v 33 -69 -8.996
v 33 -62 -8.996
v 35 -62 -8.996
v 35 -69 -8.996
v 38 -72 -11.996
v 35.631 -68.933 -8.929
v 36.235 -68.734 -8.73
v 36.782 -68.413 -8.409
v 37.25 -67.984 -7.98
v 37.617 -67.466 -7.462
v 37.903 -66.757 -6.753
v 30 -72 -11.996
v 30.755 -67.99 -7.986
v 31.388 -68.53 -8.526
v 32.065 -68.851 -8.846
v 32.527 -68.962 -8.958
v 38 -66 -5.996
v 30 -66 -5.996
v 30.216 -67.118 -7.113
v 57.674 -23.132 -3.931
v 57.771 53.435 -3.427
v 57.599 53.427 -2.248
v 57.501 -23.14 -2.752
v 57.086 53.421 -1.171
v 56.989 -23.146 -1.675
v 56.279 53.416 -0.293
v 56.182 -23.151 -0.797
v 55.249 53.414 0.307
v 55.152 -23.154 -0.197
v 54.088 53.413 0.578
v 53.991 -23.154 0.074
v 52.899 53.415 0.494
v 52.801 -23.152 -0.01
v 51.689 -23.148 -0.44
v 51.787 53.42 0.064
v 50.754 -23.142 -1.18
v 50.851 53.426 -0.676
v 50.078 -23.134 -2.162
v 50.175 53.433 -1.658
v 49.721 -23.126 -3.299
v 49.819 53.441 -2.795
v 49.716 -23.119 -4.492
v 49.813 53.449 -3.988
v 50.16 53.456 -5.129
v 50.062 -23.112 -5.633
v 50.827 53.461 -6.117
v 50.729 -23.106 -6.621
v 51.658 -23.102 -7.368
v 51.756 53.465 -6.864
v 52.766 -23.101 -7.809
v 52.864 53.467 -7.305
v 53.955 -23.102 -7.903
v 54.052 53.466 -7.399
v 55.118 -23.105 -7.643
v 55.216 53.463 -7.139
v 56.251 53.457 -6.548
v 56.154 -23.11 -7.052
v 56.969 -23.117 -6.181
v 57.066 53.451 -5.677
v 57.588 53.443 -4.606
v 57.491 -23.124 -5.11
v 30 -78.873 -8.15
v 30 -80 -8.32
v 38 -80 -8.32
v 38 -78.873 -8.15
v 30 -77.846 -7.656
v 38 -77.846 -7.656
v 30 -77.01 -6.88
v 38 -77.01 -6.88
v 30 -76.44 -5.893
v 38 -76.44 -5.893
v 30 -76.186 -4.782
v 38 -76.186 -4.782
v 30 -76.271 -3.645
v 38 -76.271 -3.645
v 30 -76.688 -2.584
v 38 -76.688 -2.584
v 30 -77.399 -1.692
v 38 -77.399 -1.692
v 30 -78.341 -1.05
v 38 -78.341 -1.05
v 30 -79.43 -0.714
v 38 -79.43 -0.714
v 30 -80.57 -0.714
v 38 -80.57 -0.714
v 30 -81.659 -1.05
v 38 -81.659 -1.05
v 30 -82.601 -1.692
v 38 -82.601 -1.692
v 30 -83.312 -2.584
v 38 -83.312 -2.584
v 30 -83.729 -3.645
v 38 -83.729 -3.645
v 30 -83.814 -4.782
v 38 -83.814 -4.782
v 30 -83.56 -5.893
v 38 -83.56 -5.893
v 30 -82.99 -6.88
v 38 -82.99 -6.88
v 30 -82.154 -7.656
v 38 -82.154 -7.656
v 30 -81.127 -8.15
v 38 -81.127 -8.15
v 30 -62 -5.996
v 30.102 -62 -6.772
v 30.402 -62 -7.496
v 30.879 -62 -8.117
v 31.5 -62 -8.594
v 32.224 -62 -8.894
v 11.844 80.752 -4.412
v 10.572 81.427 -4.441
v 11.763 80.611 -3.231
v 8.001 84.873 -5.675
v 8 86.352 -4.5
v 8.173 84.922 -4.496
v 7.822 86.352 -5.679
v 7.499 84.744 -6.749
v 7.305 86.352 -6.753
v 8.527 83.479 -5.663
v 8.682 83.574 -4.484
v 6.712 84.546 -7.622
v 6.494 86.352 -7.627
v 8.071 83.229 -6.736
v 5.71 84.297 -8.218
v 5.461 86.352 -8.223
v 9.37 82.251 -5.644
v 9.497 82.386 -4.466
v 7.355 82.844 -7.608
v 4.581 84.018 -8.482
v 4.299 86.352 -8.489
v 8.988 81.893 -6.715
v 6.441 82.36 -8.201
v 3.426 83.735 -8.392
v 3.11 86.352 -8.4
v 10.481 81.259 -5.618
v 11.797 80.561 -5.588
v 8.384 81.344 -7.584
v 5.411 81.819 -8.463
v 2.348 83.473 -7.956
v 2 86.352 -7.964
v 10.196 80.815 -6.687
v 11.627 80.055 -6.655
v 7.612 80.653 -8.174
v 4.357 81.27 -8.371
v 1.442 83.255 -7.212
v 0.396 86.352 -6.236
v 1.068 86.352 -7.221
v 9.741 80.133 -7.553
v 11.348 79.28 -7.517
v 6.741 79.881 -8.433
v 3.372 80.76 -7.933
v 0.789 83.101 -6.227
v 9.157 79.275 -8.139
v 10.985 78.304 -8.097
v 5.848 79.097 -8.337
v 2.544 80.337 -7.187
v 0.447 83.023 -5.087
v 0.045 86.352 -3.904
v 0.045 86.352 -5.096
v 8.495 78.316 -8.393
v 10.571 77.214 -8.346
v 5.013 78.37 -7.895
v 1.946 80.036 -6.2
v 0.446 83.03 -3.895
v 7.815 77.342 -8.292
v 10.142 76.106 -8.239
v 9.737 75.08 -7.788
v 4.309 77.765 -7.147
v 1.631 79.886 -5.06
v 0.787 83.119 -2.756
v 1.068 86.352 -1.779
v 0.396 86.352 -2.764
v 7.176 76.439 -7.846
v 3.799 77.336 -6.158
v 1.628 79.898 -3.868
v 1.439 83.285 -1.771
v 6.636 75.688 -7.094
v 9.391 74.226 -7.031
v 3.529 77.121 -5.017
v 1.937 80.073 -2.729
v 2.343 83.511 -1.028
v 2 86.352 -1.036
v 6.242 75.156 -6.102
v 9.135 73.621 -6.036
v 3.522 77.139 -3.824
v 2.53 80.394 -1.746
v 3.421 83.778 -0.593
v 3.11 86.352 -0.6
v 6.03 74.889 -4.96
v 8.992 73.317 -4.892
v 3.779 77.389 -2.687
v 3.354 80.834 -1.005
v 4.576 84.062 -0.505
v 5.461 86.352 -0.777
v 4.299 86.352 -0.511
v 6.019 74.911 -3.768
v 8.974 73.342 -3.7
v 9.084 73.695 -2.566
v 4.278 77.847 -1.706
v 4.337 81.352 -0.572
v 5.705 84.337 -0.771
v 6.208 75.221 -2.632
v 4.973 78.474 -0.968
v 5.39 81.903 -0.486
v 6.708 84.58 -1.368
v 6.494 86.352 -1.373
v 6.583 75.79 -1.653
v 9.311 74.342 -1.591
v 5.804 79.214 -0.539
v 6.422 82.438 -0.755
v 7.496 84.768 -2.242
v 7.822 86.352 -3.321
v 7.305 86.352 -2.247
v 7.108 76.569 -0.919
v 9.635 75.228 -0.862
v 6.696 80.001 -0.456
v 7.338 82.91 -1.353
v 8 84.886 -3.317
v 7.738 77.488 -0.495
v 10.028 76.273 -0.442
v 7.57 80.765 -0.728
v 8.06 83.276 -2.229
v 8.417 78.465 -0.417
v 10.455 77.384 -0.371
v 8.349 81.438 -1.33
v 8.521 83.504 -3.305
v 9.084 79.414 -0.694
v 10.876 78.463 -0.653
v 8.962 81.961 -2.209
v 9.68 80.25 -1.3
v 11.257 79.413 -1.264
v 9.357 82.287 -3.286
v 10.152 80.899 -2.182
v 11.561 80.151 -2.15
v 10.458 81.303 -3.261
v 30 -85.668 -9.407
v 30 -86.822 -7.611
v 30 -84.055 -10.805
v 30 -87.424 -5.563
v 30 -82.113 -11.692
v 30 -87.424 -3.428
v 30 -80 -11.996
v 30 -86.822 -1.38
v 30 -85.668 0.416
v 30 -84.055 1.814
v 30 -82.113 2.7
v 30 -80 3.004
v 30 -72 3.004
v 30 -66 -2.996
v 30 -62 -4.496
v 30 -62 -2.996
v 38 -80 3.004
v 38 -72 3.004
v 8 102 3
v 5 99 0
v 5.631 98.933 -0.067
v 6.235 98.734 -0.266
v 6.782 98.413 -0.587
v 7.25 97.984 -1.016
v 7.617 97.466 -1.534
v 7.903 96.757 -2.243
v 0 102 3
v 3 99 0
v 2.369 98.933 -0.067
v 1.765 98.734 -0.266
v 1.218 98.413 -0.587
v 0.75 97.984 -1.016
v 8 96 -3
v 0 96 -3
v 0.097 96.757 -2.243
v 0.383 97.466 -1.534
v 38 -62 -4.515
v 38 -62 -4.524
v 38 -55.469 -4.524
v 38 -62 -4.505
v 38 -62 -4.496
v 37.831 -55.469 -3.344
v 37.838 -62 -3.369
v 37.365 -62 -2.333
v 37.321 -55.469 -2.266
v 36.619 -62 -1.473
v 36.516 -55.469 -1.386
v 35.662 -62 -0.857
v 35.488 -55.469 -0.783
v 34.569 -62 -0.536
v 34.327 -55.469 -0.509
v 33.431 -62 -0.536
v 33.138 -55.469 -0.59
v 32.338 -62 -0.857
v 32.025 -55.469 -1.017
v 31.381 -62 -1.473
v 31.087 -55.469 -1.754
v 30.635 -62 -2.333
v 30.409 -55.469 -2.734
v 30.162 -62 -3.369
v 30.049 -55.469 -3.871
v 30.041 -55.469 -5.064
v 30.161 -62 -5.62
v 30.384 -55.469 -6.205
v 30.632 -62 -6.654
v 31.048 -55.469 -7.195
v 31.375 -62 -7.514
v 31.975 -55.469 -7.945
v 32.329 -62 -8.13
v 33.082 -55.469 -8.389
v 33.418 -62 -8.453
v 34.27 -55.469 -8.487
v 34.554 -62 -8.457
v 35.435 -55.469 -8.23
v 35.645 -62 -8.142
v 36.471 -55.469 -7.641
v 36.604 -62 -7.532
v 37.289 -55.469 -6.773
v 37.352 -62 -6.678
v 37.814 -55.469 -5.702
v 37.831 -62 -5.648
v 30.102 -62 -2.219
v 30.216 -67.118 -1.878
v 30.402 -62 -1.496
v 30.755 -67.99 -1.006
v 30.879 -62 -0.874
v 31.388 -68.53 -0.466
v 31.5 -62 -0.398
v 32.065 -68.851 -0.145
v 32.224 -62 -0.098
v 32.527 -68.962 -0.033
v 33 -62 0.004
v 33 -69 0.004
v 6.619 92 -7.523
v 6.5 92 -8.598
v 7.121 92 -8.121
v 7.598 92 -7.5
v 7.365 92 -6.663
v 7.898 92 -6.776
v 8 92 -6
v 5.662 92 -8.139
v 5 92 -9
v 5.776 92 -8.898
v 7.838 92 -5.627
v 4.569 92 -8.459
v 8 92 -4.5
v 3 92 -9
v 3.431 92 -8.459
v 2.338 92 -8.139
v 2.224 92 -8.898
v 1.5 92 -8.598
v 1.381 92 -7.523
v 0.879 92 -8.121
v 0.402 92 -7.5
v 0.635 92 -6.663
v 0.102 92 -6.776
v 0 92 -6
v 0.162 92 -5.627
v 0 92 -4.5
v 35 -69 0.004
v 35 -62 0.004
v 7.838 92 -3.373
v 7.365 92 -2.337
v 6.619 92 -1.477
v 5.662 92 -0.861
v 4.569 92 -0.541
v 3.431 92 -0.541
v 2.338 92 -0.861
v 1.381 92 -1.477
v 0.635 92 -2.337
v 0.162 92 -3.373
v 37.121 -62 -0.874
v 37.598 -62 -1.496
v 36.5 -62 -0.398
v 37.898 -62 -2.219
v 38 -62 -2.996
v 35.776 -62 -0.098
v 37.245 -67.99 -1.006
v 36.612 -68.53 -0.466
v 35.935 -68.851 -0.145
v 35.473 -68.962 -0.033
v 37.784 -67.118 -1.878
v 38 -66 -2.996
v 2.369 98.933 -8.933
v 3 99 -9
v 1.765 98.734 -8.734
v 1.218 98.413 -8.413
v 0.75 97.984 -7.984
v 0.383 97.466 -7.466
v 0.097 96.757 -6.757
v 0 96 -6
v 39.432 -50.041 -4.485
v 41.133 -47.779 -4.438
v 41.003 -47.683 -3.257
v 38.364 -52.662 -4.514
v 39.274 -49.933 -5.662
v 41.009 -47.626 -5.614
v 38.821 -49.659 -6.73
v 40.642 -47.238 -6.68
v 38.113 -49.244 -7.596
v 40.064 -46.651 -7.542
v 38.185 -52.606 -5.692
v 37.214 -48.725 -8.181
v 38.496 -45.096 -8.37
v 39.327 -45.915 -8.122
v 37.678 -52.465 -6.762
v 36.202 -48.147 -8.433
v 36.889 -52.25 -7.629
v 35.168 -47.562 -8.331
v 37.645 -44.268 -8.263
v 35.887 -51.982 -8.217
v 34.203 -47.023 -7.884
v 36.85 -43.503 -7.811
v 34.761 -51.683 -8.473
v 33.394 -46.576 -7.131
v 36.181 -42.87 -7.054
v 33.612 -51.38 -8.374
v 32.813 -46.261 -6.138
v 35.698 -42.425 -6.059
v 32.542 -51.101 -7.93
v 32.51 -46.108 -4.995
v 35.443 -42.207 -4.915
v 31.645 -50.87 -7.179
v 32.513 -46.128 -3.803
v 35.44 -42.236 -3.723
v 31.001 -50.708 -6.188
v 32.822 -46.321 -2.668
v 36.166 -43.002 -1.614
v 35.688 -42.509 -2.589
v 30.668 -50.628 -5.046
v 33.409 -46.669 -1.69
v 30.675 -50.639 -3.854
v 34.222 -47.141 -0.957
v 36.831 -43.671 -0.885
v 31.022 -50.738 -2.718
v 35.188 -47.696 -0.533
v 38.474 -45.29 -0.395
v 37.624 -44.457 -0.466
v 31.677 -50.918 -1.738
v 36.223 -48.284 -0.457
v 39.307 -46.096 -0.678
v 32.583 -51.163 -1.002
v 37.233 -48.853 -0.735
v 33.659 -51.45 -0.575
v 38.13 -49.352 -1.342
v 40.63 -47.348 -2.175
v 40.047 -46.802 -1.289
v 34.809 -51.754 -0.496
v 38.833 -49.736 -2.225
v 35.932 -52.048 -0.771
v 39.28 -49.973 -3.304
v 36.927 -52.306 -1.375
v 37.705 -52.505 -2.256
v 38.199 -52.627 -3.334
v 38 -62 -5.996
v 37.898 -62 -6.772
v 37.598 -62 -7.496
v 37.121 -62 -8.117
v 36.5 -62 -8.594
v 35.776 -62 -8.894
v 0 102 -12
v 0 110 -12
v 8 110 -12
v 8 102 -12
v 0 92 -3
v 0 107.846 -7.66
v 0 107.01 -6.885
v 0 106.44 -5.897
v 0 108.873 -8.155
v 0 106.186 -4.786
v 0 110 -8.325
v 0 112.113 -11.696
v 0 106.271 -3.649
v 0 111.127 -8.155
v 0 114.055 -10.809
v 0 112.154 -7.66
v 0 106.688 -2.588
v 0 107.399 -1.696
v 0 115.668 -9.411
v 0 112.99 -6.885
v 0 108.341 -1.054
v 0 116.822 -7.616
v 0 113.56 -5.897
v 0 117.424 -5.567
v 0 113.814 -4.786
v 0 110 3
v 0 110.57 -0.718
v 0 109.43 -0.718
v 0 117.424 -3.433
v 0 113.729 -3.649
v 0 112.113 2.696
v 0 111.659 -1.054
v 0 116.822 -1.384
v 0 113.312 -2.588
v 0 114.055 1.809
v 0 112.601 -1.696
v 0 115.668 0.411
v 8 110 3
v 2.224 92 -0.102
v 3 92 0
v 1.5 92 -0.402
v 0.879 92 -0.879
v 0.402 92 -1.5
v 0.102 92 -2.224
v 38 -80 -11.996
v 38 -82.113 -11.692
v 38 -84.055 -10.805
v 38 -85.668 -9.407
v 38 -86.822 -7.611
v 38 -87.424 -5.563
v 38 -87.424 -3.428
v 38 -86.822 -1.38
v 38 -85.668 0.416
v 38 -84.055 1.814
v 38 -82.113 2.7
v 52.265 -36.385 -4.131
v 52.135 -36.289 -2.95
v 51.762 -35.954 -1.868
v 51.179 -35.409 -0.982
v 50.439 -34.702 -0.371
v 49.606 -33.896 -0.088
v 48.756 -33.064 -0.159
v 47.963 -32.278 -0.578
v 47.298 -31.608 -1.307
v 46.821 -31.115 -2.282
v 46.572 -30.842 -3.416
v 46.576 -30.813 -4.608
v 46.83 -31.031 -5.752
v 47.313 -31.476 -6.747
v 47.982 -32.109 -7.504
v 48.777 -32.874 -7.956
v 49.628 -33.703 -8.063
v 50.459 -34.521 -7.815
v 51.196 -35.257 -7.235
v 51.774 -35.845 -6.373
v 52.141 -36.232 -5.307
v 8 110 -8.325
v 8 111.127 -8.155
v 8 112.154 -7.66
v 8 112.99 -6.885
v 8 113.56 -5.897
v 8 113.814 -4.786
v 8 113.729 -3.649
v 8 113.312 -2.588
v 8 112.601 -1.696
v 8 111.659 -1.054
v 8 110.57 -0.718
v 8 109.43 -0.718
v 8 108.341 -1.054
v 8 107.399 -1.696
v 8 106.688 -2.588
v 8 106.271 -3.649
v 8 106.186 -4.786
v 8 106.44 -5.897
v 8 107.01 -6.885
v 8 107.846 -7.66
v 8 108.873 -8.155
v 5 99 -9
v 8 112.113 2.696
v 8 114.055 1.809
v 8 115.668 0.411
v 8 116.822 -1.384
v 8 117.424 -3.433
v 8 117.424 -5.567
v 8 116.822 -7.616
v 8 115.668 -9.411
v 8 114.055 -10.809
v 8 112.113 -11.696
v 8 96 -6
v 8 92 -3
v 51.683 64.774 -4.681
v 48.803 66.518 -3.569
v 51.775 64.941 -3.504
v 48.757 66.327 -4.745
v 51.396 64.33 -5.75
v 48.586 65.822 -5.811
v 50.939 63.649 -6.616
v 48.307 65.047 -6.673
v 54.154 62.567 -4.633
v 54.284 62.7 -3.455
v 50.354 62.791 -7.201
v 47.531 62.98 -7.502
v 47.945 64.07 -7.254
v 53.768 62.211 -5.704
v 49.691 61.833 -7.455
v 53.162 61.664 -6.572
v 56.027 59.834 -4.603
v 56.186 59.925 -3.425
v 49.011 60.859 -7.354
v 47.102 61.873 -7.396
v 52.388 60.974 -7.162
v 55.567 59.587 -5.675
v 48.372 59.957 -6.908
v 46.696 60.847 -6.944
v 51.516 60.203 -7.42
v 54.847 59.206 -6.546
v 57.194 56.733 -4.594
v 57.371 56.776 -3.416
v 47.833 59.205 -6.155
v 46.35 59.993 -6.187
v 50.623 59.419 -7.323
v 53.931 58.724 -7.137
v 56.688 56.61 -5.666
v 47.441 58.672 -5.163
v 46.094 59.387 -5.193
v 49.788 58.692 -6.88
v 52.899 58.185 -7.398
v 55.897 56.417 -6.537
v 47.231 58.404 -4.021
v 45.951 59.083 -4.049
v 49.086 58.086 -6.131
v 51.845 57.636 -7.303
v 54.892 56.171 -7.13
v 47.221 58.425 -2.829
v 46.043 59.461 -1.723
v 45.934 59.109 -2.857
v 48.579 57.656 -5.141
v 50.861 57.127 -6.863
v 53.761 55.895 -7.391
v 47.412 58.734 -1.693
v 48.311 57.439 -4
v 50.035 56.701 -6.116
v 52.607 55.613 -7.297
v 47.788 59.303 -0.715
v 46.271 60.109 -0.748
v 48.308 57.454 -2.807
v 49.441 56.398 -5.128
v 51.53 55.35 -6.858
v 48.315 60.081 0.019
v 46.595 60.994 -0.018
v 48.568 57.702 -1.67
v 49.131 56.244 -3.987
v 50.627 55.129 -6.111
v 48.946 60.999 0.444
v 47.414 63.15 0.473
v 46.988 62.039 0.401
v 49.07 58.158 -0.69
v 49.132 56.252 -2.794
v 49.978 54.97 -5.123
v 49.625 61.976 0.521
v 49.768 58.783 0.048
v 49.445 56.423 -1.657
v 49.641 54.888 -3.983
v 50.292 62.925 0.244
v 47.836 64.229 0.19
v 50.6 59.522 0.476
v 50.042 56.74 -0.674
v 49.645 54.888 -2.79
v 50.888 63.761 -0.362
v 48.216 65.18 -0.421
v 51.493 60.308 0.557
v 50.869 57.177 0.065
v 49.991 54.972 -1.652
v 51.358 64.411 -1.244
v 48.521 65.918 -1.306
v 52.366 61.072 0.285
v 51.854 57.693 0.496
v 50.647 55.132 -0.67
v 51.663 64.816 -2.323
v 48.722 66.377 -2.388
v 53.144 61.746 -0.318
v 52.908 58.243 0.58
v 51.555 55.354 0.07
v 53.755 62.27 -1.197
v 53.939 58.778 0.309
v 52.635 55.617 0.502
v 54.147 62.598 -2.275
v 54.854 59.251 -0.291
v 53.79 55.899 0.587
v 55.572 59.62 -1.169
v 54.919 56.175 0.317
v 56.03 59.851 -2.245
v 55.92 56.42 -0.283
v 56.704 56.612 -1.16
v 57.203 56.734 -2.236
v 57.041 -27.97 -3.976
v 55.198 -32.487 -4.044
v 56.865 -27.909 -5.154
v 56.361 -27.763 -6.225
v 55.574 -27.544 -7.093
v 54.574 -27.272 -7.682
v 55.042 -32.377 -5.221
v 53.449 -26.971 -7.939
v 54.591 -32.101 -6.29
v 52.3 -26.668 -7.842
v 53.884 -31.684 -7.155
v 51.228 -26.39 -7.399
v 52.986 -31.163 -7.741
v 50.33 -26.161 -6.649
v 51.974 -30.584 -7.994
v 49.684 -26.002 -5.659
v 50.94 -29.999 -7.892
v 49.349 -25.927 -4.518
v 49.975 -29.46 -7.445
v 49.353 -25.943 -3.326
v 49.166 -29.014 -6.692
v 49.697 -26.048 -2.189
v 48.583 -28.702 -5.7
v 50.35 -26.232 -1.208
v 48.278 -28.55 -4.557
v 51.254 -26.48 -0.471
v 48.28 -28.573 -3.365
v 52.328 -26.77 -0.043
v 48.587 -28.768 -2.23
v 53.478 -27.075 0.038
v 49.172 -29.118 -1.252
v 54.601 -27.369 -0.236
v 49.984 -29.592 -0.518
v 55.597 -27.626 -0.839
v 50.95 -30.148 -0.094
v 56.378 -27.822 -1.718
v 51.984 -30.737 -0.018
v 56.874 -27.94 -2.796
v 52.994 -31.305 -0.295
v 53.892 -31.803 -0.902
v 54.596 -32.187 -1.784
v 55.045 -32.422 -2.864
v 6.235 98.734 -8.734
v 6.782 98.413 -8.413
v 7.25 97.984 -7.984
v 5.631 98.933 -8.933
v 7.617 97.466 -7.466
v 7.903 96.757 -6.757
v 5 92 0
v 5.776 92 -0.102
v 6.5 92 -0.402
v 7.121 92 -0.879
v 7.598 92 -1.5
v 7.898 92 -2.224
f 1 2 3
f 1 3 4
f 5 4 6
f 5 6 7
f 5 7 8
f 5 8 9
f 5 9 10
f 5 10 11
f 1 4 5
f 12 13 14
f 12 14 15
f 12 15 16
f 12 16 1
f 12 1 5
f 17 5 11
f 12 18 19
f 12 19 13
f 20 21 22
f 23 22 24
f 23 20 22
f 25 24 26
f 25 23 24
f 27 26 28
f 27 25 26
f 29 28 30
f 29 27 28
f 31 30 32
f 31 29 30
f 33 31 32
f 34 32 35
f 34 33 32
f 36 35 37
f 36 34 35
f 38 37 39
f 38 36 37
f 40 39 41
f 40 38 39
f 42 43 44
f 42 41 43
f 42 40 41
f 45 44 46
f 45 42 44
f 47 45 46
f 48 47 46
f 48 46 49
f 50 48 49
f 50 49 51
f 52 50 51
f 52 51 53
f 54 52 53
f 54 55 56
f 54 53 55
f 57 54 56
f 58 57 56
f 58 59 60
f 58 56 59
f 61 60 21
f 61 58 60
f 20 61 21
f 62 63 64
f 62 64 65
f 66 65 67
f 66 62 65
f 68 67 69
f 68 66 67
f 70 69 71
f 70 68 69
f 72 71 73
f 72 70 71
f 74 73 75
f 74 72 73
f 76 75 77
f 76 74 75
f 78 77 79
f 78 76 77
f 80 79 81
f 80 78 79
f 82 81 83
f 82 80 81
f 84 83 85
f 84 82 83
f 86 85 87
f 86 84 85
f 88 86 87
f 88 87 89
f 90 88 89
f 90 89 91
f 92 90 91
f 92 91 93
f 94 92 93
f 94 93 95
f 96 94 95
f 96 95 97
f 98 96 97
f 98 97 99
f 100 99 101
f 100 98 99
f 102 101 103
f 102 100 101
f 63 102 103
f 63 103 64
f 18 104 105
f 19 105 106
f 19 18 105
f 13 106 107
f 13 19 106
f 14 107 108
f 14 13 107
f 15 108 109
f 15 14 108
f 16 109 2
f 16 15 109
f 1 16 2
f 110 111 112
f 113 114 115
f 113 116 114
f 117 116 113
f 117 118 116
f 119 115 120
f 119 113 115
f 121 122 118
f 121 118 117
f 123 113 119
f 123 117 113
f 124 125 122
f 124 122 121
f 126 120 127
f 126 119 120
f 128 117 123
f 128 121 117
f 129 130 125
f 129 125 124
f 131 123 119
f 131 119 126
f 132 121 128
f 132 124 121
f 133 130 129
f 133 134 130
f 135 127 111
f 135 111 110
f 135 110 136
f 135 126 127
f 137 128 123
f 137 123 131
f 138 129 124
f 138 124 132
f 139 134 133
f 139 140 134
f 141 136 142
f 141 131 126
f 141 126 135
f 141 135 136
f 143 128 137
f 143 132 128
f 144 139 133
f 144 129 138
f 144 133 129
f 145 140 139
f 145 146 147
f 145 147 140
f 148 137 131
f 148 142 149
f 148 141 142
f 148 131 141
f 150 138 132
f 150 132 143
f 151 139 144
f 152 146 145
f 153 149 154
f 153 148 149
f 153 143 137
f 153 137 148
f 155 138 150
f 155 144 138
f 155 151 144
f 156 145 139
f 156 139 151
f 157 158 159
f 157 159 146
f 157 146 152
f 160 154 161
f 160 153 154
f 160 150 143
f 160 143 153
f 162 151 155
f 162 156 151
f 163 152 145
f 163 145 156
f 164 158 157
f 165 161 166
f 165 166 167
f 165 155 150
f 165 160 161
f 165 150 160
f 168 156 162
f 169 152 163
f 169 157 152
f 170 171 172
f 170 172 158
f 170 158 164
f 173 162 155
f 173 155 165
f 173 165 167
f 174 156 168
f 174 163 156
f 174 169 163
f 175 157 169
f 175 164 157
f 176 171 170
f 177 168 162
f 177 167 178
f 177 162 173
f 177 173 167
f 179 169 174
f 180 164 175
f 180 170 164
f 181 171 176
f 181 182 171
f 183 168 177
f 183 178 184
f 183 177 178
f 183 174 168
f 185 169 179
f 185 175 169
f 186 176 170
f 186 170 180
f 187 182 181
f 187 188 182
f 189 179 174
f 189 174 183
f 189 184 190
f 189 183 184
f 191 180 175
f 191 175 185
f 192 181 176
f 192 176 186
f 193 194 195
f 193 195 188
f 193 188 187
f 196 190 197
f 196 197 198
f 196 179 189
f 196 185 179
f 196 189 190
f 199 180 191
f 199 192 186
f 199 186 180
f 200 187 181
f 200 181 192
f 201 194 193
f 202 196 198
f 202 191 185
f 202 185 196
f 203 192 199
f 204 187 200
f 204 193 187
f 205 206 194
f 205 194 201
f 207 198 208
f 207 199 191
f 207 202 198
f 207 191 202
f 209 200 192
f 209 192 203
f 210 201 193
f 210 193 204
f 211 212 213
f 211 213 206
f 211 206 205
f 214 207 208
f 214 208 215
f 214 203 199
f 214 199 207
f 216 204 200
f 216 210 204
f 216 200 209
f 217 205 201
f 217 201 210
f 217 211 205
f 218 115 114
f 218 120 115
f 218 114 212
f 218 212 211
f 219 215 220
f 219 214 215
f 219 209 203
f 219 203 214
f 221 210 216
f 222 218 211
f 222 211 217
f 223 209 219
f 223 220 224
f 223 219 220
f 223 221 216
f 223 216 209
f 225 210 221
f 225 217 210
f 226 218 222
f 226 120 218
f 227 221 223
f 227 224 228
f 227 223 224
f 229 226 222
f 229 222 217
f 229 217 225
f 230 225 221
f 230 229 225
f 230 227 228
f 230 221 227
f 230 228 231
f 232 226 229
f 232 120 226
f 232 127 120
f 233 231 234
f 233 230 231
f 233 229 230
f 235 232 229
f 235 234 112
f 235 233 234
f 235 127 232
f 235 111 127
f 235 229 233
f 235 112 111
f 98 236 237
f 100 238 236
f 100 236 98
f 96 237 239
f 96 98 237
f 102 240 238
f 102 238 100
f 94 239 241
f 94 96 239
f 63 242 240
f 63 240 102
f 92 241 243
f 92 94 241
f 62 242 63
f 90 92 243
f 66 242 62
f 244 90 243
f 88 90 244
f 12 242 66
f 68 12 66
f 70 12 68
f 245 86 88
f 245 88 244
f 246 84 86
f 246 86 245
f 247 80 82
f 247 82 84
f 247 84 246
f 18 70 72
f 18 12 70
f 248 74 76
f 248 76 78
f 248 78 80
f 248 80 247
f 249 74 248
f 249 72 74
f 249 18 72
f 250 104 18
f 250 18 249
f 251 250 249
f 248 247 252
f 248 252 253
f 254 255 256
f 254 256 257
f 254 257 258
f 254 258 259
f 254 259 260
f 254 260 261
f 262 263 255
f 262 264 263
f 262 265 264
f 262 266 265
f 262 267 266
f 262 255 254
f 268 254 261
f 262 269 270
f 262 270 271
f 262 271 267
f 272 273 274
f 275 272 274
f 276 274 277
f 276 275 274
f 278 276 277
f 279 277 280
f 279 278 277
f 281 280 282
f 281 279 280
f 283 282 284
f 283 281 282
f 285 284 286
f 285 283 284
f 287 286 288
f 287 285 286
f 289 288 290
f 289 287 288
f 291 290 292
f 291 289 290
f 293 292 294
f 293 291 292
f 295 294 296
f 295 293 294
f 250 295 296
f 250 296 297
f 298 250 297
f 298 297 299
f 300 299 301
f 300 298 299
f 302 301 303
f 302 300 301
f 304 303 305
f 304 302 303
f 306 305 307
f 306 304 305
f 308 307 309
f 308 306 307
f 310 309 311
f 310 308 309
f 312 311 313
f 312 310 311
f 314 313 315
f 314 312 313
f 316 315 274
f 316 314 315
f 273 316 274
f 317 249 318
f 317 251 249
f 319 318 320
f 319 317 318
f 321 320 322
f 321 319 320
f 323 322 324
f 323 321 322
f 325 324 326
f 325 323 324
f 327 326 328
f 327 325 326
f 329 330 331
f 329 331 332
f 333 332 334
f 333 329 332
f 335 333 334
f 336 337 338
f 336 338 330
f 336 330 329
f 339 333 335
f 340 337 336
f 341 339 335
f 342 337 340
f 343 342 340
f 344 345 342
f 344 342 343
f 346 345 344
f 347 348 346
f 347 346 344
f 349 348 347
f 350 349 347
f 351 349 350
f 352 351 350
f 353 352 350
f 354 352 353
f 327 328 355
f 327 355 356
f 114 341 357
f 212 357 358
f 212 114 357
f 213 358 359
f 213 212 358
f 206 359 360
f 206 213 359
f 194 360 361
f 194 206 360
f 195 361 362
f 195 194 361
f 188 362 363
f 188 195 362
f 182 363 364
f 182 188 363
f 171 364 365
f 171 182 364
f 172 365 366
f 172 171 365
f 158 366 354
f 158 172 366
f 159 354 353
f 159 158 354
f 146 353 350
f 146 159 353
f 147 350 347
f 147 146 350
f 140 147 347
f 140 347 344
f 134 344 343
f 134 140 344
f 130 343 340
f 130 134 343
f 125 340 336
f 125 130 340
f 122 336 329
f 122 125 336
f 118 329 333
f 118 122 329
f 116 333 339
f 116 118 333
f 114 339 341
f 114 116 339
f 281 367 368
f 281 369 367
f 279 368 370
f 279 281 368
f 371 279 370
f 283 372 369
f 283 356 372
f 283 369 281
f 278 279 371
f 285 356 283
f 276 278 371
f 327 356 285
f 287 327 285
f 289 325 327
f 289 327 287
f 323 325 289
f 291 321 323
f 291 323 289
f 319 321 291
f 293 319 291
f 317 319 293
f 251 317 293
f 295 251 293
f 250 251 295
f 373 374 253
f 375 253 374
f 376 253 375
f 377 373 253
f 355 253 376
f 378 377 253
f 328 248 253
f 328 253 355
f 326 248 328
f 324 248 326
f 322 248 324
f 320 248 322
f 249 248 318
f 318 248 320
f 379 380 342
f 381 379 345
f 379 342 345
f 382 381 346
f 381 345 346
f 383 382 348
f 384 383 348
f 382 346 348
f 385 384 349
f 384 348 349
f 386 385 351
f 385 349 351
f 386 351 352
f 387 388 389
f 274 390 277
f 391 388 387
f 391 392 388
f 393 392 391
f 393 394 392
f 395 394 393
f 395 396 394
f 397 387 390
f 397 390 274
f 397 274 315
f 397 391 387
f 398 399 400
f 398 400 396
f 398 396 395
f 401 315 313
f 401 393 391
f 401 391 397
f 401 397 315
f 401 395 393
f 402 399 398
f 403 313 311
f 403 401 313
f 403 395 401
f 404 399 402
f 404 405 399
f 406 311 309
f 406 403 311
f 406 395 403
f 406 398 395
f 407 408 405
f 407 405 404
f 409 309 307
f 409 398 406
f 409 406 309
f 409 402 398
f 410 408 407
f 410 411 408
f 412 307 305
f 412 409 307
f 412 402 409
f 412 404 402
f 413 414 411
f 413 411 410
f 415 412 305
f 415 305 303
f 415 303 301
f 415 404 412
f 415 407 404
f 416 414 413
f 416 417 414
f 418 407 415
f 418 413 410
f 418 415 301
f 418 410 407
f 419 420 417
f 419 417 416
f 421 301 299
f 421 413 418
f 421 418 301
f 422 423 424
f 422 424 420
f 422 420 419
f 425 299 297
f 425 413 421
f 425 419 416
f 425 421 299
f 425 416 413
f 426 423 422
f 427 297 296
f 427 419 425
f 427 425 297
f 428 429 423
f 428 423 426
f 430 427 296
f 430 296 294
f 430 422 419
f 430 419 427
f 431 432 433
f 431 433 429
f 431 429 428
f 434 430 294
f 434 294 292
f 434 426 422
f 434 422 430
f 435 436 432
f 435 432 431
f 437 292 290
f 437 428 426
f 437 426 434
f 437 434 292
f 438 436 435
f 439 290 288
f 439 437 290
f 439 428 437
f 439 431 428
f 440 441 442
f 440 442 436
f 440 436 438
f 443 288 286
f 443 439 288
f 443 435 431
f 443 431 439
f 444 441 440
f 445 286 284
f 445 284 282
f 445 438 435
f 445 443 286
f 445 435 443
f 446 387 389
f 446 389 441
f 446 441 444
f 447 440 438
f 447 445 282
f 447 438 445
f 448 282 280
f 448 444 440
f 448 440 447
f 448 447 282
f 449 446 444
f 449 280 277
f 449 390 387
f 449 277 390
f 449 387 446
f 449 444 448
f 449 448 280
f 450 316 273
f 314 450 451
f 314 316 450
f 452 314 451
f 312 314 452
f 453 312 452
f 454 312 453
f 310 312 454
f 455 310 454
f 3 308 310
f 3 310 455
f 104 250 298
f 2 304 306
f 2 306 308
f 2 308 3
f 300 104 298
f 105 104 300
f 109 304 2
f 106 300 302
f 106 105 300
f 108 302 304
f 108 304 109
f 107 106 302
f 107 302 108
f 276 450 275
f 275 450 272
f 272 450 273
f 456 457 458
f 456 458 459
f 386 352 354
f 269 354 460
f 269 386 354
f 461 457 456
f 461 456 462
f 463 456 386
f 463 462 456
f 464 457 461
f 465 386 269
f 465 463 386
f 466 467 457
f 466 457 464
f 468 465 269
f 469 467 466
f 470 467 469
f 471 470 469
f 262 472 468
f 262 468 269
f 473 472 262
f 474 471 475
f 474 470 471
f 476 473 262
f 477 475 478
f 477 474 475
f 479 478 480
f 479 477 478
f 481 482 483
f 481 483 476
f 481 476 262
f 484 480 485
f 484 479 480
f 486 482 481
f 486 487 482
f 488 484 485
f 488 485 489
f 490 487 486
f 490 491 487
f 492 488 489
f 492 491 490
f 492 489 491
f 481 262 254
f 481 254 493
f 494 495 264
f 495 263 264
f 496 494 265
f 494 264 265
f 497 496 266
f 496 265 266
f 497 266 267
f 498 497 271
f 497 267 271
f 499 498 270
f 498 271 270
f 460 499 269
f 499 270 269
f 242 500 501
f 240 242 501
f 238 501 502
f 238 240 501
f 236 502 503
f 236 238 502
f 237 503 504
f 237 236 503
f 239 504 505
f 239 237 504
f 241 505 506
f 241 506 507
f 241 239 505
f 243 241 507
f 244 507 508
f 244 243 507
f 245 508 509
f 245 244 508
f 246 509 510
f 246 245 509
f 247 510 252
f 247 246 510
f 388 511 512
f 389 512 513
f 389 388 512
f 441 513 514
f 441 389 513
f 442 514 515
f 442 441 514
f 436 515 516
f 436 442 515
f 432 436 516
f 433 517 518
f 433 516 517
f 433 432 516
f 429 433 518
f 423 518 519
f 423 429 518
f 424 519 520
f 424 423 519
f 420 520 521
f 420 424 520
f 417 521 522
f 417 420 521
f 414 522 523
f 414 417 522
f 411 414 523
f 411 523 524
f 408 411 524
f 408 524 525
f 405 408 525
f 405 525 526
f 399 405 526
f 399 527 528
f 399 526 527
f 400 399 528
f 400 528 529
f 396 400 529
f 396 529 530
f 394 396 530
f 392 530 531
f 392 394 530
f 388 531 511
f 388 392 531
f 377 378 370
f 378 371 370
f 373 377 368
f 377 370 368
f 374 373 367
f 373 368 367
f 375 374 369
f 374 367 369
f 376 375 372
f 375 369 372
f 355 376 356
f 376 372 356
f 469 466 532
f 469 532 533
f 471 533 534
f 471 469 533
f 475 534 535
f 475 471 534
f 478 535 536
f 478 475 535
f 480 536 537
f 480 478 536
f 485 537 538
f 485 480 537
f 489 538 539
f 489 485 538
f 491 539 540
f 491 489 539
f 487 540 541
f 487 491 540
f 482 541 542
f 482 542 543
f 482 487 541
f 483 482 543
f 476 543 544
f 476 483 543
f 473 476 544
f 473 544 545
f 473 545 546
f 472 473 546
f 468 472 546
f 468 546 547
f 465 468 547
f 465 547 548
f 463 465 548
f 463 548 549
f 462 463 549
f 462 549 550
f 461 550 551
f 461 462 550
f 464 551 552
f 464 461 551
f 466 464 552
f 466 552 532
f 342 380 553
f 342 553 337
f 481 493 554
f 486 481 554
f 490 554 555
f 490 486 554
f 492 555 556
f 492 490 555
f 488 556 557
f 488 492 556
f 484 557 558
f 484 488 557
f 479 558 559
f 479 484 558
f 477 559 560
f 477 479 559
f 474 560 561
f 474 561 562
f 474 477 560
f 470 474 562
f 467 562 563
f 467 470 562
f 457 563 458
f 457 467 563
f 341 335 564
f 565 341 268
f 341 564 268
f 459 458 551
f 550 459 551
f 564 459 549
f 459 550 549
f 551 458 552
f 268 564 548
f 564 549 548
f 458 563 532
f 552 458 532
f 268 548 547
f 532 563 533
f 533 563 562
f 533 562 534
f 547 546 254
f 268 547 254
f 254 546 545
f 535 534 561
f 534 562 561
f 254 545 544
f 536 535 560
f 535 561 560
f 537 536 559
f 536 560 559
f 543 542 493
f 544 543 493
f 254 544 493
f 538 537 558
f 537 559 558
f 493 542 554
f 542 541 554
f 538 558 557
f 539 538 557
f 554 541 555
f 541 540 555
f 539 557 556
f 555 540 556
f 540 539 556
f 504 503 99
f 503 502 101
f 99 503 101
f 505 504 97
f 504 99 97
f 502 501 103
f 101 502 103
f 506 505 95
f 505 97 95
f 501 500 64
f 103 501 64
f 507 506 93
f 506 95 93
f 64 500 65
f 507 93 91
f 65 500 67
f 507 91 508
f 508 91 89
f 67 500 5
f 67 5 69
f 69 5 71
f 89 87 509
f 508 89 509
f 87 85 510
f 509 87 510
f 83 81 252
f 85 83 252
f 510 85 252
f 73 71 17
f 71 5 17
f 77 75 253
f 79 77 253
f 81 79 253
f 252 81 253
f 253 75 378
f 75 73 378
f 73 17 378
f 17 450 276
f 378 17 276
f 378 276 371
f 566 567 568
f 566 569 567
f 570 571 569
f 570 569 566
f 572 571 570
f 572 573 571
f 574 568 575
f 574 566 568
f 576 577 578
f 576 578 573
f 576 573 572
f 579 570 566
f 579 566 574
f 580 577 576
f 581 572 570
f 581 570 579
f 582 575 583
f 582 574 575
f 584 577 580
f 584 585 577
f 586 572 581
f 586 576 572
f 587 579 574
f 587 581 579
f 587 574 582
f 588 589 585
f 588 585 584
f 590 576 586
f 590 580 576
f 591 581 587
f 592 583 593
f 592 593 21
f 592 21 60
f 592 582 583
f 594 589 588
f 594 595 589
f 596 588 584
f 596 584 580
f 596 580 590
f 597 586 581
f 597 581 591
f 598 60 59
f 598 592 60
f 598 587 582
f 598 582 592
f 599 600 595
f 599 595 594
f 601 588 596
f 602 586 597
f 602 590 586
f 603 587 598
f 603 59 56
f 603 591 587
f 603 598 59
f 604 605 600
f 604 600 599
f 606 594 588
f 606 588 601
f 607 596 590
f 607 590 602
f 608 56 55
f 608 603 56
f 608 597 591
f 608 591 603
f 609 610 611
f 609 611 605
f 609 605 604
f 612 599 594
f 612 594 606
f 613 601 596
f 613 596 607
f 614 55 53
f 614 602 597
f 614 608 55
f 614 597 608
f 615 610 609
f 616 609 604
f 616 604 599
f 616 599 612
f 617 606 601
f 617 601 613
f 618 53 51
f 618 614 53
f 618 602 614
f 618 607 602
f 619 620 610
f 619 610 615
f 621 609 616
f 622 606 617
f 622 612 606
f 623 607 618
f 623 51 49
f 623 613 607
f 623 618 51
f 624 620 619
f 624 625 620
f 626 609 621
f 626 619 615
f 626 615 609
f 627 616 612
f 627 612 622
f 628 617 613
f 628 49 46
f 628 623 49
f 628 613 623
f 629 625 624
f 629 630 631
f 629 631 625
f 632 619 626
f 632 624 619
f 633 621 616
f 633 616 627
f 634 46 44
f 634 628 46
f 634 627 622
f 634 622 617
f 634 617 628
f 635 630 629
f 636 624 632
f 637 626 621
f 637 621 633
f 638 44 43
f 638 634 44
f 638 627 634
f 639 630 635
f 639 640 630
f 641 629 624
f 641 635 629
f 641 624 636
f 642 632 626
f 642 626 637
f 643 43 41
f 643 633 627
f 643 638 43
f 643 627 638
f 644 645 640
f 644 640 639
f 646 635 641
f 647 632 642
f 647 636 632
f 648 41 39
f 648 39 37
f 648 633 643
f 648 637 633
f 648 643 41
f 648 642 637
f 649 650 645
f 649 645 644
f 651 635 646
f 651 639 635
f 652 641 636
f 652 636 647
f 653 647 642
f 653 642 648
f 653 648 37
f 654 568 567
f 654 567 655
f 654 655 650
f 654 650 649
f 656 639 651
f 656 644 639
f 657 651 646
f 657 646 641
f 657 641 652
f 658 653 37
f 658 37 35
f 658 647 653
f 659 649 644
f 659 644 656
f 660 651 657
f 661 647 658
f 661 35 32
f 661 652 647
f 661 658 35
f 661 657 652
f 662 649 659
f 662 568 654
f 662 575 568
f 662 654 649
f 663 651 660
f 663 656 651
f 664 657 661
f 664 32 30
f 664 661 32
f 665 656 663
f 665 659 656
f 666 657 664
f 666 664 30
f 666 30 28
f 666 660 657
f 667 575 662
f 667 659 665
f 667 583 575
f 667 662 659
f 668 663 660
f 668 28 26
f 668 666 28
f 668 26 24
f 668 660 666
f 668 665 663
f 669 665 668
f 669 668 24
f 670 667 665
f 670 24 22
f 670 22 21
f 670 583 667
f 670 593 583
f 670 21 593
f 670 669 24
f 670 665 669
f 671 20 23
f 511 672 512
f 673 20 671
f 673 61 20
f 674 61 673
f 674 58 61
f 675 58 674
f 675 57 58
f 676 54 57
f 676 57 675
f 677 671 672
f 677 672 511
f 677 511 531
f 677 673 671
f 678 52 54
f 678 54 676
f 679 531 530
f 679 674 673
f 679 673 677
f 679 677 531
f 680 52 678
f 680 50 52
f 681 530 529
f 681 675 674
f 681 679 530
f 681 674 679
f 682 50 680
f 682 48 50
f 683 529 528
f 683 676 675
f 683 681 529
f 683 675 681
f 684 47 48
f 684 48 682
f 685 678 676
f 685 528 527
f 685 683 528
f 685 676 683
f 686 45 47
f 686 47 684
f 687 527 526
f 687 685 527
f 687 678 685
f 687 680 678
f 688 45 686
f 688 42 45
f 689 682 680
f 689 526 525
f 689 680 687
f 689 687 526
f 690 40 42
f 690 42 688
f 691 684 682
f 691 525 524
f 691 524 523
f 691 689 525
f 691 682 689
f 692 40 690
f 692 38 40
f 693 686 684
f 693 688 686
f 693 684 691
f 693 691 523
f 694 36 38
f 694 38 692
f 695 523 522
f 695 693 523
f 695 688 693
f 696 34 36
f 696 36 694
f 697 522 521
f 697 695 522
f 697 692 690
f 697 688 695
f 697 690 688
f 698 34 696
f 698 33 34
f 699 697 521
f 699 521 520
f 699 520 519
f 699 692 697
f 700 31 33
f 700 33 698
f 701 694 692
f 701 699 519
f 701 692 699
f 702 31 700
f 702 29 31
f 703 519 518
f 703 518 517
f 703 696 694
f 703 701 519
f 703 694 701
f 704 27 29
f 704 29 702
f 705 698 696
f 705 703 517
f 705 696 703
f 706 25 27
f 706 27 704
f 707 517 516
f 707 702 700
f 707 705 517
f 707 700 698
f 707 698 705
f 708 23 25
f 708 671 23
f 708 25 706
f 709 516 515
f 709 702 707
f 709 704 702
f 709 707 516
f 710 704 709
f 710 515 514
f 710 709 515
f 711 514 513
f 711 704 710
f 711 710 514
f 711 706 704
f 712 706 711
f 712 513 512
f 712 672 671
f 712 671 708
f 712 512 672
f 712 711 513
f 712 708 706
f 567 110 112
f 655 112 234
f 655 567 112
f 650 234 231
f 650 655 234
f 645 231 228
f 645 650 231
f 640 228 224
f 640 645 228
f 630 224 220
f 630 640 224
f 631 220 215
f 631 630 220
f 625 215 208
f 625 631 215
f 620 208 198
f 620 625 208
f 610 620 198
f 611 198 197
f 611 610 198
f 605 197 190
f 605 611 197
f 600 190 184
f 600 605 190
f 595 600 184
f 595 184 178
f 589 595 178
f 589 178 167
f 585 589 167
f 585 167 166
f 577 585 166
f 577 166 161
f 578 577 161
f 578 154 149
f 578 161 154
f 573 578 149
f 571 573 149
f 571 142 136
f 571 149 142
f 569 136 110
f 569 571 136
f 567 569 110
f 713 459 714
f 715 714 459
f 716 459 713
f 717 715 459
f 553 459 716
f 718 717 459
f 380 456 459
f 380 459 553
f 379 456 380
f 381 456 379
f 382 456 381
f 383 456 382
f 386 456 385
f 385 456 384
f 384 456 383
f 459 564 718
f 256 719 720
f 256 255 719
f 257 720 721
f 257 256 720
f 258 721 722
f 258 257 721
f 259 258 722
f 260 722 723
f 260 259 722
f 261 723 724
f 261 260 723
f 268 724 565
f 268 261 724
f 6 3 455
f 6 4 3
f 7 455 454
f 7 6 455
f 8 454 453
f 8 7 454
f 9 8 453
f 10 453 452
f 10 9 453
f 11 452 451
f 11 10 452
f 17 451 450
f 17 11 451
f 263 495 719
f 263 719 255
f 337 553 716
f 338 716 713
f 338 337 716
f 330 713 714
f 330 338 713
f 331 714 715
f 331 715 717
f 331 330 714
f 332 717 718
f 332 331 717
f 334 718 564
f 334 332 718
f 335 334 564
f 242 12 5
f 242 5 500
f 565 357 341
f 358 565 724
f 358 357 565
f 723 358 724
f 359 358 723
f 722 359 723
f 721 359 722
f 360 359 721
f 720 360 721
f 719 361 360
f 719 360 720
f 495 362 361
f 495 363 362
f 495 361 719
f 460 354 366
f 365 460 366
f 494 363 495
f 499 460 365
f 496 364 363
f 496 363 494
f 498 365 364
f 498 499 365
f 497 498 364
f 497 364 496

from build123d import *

# Parameters (mm, degrees)
SKETCH1_R           = 3.824529863
BOSS_EXTRUDE1_DEPTH = 8
FILLET1_R           = 3
SKETCH4_R           = 3.824529863
BOSS_EXTRUDE3_DEPTH = 8
SKETCH5_R           = 4
FILLET3_R           = 3


with BuildPart() as part:
    # Sketch1 → Boss-Extrude1 (new body)
    with BuildSketch(Plane(origin=(0, 0, 0), x_dir=(0, 0, -1), z_dir=(1, 0, 0))):
        with BuildLine():
            Line((0, 92), (0, 99))
            Line((0, 99), (-3, 102))
            Line((-3, 102), (-3, 110))
            ThreePointArc((-3, 110), (4.5, 117.5), (12, 110))
            Line((12, 110), (12, 102))
            Line((12, 102), (9, 99))
            Line((9, 99), (9, 92))
            Line((9, 92), (0, 92))
        make_face()
        with Locations((4.5, 110)):
            Circle(SKETCH1_R, mode=Mode.SUBTRACT)
    extrude(amount=BOSS_EXTRUDE1_DEPTH)

    # Fillet1
    fillet1_edges = [part.edges().sort_by_distance(p)[0] for p in [
        (0, 95.5, -9),
        (8, 95.5, 0),
        (8, 95.5, -9),
        (0, 95.5, 0),
    ]]
    fillet(fillet1_edges, radius=FILLET1_R)



with BuildPart() as body_2:
    # Sketch4 → Boss-Extrude3 (new body)
    with BuildSketch(Plane(origin=(30, 0, 0), x_dir=(0, 0, -1), z_dir=(1, 0, 0))):
        with BuildLine():
            Line((-0.004228731, -61.999999953), (8.995771269, -61.999999953))
            Line((8.995771269, -61.999999953), (8.995771269, -68.999999953))
            Line((8.995771269, -68.999999953), (11.995771269, -71.999999953))
            Line((11.995771269, -71.999999953), (11.995771269, -79.999999953))
            ThreePointArc((11.995771269, -79.999999953), (4.495771269, -87.499999953), (-3.004228731, -79.999999953))
            Line((-3.004228731, -79.999999953), (-3.004228731, -71.999999953))
            Line((-3.004228731, -71.999999953), (-0.004228731, -68.999999953))
            Line((-0.004228731, -68.999999953), (-0.004228731, -61.999999953))
        make_face()
        with Locations((4.495771269, -79.999999953)):
            Circle(SKETCH4_R, mode=Mode.SUBTRACT)
    extrude(amount=BOSS_EXTRUDE3_DEPTH)


with BuildPart() as part_1:
    add(part.part)

    add(body_2.part)  # Sweep1 merges body 2
    # Sweep1: sweep along a curve in space
    with BuildLine() as sweep1_path:
        Line((4, 92, -4.5), (4, 86.352130242, -4.5))
        ThreePointArc((4, 86.352130242, -4.5), (5.755444944, 80.69219678, -4.459942659), (10.405301947, 77.019920921, -4.353837987))
        Line((10.405301947, 77.019920921, -4.353837987), (47.364863067, 62.786270522, -3.510461064))
        ThreePointArc((47.364863067, 62.786270522, -3.510461064), (52.019060491, 59.108139902, -3.416609062), (53.77123923, 53.439910597, -3.409333713))
        Line((53.77123923, 53.439910597, -3.409333713), (53.673864596, -23.127444485, -3.913324031))
        ThreePointArc((49.40348763, -33.590655921, -4.071020723), (52.56170451, -28.776861802, -3.973565781), (53.673864596, -23.127444485, -3.913324031))
        Line((38.271359037, -44.984282045, -4.377988717), (49.40348763, -33.590655921, -4.071020723))
        ThreePointArc((34, -55.469085278, -4.495771269), (35.108839506, -49.80804563, -4.465195064), (38.271359037, -44.984282045, -4.377988717))
        Line((34, -61.999999953, -4.495771269), (34, -55.469085278, -4.495771269))
    # Sketch5 → Sweep1 (sweep)
    with BuildSketch(Plane.XZ.offset(-92)):
        with Locations((4, -4.5)):
            Circle(SKETCH5_R)
    sweep(path=sweep1_path.line)

    # Fillet3
    fillet3_edges = [part_1.edges().sort_by_distance(p)[0] for p in [
        (38, -65.499999953, -8.995771269),
        (38, -65.499999953, 0.004228731),
        (30, -65.499999953, -8.995771269),
        (30, -65.499999953, 0.004228731),
    ]]
    fillet(fillet3_edges, radius=FILLET3_R)


solid = part_1.part
